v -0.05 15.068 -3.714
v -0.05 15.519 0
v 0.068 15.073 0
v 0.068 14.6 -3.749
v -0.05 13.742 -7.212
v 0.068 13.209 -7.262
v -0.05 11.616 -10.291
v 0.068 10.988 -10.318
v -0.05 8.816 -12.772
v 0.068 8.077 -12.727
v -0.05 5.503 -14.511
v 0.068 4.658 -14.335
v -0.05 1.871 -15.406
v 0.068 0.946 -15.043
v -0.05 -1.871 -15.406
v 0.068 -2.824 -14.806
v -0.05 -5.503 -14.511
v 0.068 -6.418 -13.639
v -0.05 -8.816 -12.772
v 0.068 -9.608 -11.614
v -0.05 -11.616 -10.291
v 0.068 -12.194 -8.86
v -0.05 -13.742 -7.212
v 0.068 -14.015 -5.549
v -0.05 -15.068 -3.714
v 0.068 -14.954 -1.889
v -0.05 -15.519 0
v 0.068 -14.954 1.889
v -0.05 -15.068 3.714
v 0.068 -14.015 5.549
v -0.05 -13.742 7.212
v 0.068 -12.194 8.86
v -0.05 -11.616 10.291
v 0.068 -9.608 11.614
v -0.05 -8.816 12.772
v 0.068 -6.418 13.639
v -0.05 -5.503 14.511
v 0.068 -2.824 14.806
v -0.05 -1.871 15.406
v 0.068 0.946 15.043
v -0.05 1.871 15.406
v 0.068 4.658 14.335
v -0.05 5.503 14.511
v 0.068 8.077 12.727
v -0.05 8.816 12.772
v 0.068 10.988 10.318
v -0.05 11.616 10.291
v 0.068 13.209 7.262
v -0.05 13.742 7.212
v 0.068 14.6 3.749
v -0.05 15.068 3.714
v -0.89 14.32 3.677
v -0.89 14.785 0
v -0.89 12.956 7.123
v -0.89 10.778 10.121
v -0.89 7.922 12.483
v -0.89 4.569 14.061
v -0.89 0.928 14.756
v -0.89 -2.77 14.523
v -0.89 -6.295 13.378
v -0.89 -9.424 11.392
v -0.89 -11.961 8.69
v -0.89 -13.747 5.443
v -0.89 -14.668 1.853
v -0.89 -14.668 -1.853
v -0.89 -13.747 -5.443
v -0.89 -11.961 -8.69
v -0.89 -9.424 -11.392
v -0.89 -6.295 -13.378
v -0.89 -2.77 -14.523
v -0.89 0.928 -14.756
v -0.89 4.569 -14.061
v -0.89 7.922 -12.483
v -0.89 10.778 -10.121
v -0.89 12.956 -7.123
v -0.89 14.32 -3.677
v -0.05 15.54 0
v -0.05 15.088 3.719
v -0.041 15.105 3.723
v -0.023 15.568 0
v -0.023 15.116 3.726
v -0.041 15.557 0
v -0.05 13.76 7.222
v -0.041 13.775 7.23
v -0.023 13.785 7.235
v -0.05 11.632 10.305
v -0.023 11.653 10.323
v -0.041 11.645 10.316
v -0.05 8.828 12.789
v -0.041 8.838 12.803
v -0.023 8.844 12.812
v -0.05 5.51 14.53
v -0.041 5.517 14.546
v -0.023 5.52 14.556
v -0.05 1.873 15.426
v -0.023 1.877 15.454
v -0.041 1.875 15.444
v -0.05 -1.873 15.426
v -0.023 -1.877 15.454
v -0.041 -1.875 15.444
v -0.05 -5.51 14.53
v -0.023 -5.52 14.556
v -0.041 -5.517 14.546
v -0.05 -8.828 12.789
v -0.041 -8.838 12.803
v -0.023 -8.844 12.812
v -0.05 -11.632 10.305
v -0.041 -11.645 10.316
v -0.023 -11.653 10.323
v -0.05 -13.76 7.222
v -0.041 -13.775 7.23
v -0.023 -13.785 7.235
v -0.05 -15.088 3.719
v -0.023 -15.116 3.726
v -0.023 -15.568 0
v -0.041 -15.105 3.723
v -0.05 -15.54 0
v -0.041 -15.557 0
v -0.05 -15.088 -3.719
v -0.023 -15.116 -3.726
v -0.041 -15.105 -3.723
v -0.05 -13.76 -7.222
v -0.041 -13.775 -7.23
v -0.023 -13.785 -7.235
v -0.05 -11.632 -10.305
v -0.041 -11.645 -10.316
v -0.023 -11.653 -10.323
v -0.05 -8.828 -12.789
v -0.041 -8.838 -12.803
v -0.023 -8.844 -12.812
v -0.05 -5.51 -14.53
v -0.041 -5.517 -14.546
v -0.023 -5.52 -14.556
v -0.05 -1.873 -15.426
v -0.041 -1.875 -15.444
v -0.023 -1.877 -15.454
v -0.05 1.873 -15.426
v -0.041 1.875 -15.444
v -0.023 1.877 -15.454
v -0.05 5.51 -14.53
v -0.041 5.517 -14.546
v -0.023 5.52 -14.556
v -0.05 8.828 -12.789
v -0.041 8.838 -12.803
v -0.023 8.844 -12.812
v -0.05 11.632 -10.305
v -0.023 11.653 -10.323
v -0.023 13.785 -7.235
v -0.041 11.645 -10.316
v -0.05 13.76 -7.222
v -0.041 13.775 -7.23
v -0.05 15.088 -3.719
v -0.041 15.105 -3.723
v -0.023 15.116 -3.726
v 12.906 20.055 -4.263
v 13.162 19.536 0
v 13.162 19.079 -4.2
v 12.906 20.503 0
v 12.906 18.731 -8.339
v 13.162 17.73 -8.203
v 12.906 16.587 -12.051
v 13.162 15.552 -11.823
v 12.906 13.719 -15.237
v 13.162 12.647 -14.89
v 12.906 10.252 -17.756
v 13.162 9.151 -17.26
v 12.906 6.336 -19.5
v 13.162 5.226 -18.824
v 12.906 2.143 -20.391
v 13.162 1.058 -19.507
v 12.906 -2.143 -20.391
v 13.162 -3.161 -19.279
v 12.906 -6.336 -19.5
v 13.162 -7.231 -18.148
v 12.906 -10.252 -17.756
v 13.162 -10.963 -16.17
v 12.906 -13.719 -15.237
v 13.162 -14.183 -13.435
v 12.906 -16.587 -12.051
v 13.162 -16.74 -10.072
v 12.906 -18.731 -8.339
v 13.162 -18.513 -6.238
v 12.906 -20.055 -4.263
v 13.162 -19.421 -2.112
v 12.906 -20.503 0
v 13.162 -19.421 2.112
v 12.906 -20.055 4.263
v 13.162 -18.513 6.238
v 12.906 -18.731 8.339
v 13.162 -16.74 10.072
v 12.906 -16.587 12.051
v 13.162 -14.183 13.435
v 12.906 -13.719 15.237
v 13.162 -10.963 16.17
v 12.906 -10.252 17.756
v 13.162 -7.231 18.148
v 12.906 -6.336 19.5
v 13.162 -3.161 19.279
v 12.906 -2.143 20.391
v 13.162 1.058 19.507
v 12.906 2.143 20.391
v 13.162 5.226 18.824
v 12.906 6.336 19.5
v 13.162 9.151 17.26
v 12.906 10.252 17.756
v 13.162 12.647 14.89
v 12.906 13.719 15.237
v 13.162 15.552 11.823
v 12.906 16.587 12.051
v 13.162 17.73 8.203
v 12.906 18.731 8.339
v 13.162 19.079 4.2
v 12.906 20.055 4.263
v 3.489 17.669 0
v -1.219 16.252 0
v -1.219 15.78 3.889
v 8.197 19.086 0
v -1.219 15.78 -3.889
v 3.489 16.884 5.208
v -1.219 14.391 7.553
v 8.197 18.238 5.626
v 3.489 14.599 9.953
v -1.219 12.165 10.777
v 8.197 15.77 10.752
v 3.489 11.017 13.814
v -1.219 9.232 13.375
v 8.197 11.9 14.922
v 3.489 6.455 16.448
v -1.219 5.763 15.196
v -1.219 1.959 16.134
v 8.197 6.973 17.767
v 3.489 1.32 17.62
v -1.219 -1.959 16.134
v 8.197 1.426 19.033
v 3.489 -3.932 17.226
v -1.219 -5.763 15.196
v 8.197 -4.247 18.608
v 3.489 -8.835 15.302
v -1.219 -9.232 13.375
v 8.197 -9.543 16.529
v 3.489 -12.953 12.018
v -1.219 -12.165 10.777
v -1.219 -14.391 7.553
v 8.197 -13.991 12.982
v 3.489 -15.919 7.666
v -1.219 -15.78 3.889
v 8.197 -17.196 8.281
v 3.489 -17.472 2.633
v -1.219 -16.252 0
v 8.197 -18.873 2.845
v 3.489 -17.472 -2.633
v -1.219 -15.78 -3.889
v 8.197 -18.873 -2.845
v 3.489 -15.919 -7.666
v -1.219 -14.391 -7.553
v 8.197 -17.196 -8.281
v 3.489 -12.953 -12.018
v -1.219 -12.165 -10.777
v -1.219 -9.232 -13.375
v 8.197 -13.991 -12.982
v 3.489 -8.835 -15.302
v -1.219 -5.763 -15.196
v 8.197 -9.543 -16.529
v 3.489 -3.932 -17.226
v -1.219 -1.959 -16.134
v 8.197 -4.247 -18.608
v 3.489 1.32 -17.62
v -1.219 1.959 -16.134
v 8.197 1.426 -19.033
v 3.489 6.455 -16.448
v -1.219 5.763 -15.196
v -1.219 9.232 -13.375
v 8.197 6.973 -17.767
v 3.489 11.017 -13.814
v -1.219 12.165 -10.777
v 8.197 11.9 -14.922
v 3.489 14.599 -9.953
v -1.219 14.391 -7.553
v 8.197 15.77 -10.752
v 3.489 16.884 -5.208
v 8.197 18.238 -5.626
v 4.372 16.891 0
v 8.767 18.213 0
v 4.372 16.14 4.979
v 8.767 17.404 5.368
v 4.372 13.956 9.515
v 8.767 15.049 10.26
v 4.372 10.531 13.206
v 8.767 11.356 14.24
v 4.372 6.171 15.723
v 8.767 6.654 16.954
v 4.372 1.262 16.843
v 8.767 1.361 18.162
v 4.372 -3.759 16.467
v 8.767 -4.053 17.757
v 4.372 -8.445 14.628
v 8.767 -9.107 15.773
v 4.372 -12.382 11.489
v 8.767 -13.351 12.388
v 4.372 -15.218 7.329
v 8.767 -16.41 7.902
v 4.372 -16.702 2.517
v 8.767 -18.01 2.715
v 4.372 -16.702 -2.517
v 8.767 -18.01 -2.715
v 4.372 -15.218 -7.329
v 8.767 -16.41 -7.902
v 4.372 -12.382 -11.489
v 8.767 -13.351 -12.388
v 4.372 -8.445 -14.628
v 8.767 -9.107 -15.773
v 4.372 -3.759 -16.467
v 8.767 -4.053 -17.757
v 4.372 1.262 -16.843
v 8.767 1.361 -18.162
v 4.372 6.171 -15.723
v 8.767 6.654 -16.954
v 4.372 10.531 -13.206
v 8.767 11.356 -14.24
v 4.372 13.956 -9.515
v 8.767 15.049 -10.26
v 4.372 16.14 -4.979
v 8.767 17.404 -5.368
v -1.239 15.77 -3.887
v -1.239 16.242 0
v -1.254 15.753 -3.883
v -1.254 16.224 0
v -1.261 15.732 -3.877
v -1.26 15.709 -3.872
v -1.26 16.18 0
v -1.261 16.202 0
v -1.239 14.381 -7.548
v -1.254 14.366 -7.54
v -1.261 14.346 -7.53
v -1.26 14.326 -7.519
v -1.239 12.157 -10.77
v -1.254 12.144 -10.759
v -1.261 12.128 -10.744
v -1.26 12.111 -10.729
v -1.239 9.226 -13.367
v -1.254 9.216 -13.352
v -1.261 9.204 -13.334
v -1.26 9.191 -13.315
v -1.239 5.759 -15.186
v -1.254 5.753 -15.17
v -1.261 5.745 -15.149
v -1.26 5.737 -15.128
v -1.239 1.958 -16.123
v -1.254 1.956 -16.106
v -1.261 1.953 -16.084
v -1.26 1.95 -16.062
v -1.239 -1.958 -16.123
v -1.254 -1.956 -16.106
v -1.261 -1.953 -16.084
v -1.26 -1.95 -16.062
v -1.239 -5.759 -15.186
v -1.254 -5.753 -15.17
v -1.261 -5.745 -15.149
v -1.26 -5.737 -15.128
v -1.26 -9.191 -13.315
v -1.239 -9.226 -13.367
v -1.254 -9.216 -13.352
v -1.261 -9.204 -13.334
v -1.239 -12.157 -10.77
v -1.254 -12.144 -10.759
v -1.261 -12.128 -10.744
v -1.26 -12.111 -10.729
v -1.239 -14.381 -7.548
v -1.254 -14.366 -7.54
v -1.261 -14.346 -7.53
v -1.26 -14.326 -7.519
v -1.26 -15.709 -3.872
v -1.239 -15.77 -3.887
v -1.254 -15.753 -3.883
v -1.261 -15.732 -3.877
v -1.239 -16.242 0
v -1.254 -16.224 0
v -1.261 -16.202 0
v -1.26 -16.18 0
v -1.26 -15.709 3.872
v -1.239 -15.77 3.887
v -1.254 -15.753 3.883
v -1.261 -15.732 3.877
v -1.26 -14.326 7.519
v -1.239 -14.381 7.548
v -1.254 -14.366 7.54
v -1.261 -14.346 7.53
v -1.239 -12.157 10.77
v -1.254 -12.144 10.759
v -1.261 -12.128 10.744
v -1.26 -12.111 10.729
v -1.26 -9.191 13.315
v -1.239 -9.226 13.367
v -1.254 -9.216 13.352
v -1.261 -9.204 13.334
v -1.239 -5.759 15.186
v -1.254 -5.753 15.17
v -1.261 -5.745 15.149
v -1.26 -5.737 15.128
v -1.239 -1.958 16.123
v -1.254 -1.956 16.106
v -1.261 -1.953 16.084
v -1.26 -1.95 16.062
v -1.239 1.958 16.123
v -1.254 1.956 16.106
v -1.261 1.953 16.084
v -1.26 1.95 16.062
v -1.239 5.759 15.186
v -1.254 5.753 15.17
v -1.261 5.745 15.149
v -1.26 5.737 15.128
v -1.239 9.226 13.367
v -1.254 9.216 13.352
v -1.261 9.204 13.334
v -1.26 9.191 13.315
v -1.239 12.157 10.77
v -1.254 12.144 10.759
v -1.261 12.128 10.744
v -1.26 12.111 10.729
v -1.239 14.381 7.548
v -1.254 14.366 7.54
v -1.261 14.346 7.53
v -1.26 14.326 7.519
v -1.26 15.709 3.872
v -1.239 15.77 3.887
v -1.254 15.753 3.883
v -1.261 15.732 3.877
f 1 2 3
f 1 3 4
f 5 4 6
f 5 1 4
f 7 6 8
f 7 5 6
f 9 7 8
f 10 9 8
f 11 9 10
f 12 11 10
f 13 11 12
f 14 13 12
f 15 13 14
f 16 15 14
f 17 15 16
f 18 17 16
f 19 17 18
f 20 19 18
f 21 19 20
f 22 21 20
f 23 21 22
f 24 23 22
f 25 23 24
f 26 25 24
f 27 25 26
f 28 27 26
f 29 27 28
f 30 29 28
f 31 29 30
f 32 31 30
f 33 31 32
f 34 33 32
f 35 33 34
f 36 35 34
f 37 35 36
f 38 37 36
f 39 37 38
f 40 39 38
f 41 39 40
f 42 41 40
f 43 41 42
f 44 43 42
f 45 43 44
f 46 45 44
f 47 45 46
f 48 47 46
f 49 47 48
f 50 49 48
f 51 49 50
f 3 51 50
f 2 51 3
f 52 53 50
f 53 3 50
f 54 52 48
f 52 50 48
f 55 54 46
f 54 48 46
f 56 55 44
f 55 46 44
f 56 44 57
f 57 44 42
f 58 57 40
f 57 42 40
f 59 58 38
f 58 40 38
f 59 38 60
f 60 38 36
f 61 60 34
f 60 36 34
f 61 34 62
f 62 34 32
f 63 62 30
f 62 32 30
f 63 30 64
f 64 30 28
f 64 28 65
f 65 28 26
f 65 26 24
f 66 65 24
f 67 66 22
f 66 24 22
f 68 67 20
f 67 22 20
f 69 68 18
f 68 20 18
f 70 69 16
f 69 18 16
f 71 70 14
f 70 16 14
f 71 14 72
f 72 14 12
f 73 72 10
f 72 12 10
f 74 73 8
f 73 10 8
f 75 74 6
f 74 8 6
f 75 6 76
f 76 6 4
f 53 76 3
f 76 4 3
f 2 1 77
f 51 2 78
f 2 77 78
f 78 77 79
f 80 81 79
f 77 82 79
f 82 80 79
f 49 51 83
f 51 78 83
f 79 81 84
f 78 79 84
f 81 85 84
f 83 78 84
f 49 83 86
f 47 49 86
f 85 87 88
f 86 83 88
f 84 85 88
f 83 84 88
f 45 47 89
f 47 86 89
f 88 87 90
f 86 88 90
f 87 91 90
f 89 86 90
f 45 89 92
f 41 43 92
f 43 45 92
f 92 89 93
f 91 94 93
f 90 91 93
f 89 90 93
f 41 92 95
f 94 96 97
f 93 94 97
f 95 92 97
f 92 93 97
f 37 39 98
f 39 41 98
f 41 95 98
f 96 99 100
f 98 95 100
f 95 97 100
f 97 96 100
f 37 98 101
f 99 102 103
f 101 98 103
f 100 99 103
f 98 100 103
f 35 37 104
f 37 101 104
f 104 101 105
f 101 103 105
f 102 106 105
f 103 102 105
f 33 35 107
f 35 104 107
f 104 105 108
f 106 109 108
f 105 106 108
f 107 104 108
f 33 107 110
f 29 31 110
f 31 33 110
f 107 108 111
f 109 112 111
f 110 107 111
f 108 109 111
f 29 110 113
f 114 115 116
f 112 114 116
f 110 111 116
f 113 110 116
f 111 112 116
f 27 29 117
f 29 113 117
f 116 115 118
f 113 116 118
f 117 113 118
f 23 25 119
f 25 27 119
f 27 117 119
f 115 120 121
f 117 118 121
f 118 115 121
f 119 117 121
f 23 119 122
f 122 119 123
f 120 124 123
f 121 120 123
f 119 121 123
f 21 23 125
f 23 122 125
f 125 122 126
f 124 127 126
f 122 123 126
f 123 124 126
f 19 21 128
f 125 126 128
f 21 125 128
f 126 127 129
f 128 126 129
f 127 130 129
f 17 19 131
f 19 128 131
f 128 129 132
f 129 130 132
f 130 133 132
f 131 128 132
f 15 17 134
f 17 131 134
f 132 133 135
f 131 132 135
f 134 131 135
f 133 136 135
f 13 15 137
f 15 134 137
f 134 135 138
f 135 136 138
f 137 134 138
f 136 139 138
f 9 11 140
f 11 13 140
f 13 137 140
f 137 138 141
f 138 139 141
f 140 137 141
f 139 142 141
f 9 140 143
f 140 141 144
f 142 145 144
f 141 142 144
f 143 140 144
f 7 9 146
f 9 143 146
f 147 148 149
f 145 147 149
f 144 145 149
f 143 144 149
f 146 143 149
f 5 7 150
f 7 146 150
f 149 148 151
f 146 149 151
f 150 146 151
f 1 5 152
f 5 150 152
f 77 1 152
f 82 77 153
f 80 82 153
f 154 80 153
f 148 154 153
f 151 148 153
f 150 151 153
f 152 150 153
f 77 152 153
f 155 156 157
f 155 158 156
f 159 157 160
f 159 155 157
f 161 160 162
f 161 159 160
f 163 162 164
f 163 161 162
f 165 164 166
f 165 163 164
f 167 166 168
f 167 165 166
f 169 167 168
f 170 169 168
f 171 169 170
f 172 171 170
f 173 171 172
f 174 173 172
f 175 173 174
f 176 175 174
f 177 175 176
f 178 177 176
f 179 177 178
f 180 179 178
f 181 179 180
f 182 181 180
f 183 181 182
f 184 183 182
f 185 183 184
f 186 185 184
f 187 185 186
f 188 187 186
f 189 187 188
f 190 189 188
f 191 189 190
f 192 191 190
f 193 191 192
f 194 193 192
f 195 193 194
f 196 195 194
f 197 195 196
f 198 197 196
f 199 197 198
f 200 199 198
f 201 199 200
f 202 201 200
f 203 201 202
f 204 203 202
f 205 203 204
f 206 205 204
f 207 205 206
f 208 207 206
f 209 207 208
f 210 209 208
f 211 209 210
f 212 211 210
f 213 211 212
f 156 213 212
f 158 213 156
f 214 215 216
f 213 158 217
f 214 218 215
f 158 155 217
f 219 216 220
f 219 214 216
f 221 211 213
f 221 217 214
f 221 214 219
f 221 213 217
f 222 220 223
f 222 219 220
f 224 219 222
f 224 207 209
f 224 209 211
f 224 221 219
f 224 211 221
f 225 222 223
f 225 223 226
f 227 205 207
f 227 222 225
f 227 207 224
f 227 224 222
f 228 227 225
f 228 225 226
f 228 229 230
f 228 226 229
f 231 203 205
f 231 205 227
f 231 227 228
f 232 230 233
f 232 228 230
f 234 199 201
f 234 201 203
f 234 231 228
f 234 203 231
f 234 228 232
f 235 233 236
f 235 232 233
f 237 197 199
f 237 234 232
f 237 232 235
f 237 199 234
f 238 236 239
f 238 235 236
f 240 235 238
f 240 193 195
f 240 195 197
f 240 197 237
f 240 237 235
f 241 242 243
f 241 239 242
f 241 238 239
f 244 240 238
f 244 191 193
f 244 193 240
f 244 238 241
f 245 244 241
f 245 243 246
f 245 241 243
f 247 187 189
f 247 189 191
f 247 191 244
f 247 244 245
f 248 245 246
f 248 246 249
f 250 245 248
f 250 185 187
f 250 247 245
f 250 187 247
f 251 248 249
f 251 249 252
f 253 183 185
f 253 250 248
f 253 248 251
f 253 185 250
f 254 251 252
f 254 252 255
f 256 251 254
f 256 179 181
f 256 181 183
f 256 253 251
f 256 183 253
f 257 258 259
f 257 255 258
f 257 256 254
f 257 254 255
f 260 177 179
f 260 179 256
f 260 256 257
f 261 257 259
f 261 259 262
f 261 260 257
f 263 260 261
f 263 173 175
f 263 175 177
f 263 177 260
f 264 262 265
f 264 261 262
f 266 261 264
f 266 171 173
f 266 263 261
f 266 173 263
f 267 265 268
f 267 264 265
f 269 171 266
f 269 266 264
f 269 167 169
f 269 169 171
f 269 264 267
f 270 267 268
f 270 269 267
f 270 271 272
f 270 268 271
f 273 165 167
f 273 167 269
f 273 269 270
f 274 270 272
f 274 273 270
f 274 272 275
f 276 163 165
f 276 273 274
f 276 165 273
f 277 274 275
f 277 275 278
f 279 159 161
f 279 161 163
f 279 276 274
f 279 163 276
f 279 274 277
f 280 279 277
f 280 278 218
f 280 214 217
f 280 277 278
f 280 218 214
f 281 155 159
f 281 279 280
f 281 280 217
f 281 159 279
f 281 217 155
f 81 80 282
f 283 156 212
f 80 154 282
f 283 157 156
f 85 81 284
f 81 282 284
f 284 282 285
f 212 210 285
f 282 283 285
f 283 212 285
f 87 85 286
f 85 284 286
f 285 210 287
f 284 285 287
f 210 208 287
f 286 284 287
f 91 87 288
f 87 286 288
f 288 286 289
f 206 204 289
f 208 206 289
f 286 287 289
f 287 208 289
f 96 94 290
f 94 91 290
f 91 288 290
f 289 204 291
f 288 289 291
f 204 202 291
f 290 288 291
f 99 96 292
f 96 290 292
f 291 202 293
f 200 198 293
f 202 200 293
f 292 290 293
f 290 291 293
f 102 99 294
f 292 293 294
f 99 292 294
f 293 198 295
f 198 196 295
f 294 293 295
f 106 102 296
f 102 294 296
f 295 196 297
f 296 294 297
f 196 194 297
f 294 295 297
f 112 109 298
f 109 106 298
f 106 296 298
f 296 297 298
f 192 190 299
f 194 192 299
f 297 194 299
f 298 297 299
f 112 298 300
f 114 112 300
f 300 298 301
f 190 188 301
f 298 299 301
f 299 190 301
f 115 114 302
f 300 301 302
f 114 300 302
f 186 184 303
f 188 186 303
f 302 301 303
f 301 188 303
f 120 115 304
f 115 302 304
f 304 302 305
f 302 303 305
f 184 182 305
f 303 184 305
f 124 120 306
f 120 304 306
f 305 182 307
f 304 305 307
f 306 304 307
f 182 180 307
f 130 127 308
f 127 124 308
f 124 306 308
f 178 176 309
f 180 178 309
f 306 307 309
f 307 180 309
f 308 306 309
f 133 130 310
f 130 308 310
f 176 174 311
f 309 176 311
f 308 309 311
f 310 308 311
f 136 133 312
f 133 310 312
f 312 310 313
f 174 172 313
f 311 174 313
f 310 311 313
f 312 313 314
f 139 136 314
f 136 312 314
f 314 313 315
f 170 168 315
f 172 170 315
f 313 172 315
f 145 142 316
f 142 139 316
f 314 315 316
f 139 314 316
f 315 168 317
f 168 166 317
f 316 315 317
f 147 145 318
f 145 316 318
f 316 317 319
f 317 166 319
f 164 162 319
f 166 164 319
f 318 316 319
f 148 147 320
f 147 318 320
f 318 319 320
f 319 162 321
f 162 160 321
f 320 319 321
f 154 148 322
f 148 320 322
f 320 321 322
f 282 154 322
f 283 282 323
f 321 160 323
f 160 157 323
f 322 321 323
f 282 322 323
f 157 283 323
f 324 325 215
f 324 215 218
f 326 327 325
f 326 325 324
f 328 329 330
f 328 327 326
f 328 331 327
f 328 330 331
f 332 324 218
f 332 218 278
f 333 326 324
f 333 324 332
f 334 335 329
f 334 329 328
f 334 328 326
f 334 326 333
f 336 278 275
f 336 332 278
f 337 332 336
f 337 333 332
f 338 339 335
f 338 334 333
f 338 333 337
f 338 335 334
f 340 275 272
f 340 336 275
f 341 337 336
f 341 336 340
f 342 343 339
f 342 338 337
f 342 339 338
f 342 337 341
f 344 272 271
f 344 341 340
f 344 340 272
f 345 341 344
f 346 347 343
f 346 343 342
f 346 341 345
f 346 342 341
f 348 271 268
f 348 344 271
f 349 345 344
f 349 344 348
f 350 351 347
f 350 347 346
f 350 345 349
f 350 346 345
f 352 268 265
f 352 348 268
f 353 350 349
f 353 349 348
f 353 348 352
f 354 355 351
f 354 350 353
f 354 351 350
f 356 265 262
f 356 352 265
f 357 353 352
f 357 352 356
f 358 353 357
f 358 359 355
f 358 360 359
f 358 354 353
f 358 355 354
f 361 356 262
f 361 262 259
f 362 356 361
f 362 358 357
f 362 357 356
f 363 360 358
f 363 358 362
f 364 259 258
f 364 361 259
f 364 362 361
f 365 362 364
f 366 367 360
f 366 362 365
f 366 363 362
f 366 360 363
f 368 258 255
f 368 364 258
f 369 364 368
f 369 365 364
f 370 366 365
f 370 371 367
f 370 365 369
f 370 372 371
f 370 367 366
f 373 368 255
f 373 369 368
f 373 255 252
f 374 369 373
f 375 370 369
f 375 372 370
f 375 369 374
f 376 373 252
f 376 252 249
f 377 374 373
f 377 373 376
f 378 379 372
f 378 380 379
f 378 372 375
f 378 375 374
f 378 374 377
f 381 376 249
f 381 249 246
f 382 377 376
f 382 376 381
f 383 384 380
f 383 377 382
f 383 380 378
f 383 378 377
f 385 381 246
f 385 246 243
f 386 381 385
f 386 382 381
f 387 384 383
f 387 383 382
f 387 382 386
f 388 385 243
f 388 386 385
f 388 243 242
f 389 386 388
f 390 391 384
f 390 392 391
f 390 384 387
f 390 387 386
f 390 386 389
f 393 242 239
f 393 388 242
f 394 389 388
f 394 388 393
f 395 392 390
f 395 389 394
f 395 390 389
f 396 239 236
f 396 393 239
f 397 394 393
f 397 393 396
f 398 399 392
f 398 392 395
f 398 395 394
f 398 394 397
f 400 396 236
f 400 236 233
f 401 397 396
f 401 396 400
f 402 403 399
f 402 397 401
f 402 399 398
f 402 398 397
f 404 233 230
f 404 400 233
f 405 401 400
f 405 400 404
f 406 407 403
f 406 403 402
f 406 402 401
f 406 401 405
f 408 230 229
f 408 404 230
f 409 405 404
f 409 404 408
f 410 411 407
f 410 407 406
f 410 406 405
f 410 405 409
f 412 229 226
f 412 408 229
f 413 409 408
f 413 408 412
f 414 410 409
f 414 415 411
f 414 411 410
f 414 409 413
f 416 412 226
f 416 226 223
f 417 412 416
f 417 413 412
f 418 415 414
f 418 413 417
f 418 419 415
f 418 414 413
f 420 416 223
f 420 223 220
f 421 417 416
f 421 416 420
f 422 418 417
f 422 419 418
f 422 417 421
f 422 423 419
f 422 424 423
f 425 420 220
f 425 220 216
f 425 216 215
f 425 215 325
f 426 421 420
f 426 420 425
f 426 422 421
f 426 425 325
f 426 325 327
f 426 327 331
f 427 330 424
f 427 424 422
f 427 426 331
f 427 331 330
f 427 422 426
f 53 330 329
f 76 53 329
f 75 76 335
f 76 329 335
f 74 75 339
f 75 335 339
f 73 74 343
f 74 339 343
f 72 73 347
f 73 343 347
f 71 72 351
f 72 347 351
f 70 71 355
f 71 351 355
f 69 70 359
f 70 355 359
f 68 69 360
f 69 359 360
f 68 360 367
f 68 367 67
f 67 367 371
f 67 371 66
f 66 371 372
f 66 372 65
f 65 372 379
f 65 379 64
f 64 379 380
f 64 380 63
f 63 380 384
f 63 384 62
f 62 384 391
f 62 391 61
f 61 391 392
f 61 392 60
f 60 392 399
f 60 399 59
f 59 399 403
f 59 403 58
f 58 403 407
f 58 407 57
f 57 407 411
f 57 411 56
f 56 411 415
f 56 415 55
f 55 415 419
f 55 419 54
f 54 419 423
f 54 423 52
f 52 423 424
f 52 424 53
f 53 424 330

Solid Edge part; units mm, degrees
sketch "Sketch1" plane through (0, 0, 0) normal (0, 0, 1) x (1, 0, 0)
  arc A0 (-1.219, 16.2523) -> (-1.2597, 16.1795) centre (-1.2017, 16.1949) ccw
  line L0 (-1.2597, 16.1795) -> (-0.8903, 14.7848)
  line L1 (-0.8903, 14.7848) -> (0.0678, 15.0731)
  line L2 (0.0678, 15.0731) -> (-0.0504, 15.5193)
  arc A1 (-0.0504, 15.5193) -> (-0.0232, 15.5679) centre (-0.0117, 15.5296) cw
  line L3 (-0.0232, 15.5679) -> (13.1616, 19.536)
  line L4 (13.1616, 19.536) -> (12.9055, 20.5032)
  line L5 (12.9055, 20.5032) -> (-1.219, 16.2523)
revolve "RevolvedProtrusion1" add sketch "Sketch1" angle 360 about axis through (50, 0, 0) along (-1, 0, 0)
properties part number "320/22 X_cage"
